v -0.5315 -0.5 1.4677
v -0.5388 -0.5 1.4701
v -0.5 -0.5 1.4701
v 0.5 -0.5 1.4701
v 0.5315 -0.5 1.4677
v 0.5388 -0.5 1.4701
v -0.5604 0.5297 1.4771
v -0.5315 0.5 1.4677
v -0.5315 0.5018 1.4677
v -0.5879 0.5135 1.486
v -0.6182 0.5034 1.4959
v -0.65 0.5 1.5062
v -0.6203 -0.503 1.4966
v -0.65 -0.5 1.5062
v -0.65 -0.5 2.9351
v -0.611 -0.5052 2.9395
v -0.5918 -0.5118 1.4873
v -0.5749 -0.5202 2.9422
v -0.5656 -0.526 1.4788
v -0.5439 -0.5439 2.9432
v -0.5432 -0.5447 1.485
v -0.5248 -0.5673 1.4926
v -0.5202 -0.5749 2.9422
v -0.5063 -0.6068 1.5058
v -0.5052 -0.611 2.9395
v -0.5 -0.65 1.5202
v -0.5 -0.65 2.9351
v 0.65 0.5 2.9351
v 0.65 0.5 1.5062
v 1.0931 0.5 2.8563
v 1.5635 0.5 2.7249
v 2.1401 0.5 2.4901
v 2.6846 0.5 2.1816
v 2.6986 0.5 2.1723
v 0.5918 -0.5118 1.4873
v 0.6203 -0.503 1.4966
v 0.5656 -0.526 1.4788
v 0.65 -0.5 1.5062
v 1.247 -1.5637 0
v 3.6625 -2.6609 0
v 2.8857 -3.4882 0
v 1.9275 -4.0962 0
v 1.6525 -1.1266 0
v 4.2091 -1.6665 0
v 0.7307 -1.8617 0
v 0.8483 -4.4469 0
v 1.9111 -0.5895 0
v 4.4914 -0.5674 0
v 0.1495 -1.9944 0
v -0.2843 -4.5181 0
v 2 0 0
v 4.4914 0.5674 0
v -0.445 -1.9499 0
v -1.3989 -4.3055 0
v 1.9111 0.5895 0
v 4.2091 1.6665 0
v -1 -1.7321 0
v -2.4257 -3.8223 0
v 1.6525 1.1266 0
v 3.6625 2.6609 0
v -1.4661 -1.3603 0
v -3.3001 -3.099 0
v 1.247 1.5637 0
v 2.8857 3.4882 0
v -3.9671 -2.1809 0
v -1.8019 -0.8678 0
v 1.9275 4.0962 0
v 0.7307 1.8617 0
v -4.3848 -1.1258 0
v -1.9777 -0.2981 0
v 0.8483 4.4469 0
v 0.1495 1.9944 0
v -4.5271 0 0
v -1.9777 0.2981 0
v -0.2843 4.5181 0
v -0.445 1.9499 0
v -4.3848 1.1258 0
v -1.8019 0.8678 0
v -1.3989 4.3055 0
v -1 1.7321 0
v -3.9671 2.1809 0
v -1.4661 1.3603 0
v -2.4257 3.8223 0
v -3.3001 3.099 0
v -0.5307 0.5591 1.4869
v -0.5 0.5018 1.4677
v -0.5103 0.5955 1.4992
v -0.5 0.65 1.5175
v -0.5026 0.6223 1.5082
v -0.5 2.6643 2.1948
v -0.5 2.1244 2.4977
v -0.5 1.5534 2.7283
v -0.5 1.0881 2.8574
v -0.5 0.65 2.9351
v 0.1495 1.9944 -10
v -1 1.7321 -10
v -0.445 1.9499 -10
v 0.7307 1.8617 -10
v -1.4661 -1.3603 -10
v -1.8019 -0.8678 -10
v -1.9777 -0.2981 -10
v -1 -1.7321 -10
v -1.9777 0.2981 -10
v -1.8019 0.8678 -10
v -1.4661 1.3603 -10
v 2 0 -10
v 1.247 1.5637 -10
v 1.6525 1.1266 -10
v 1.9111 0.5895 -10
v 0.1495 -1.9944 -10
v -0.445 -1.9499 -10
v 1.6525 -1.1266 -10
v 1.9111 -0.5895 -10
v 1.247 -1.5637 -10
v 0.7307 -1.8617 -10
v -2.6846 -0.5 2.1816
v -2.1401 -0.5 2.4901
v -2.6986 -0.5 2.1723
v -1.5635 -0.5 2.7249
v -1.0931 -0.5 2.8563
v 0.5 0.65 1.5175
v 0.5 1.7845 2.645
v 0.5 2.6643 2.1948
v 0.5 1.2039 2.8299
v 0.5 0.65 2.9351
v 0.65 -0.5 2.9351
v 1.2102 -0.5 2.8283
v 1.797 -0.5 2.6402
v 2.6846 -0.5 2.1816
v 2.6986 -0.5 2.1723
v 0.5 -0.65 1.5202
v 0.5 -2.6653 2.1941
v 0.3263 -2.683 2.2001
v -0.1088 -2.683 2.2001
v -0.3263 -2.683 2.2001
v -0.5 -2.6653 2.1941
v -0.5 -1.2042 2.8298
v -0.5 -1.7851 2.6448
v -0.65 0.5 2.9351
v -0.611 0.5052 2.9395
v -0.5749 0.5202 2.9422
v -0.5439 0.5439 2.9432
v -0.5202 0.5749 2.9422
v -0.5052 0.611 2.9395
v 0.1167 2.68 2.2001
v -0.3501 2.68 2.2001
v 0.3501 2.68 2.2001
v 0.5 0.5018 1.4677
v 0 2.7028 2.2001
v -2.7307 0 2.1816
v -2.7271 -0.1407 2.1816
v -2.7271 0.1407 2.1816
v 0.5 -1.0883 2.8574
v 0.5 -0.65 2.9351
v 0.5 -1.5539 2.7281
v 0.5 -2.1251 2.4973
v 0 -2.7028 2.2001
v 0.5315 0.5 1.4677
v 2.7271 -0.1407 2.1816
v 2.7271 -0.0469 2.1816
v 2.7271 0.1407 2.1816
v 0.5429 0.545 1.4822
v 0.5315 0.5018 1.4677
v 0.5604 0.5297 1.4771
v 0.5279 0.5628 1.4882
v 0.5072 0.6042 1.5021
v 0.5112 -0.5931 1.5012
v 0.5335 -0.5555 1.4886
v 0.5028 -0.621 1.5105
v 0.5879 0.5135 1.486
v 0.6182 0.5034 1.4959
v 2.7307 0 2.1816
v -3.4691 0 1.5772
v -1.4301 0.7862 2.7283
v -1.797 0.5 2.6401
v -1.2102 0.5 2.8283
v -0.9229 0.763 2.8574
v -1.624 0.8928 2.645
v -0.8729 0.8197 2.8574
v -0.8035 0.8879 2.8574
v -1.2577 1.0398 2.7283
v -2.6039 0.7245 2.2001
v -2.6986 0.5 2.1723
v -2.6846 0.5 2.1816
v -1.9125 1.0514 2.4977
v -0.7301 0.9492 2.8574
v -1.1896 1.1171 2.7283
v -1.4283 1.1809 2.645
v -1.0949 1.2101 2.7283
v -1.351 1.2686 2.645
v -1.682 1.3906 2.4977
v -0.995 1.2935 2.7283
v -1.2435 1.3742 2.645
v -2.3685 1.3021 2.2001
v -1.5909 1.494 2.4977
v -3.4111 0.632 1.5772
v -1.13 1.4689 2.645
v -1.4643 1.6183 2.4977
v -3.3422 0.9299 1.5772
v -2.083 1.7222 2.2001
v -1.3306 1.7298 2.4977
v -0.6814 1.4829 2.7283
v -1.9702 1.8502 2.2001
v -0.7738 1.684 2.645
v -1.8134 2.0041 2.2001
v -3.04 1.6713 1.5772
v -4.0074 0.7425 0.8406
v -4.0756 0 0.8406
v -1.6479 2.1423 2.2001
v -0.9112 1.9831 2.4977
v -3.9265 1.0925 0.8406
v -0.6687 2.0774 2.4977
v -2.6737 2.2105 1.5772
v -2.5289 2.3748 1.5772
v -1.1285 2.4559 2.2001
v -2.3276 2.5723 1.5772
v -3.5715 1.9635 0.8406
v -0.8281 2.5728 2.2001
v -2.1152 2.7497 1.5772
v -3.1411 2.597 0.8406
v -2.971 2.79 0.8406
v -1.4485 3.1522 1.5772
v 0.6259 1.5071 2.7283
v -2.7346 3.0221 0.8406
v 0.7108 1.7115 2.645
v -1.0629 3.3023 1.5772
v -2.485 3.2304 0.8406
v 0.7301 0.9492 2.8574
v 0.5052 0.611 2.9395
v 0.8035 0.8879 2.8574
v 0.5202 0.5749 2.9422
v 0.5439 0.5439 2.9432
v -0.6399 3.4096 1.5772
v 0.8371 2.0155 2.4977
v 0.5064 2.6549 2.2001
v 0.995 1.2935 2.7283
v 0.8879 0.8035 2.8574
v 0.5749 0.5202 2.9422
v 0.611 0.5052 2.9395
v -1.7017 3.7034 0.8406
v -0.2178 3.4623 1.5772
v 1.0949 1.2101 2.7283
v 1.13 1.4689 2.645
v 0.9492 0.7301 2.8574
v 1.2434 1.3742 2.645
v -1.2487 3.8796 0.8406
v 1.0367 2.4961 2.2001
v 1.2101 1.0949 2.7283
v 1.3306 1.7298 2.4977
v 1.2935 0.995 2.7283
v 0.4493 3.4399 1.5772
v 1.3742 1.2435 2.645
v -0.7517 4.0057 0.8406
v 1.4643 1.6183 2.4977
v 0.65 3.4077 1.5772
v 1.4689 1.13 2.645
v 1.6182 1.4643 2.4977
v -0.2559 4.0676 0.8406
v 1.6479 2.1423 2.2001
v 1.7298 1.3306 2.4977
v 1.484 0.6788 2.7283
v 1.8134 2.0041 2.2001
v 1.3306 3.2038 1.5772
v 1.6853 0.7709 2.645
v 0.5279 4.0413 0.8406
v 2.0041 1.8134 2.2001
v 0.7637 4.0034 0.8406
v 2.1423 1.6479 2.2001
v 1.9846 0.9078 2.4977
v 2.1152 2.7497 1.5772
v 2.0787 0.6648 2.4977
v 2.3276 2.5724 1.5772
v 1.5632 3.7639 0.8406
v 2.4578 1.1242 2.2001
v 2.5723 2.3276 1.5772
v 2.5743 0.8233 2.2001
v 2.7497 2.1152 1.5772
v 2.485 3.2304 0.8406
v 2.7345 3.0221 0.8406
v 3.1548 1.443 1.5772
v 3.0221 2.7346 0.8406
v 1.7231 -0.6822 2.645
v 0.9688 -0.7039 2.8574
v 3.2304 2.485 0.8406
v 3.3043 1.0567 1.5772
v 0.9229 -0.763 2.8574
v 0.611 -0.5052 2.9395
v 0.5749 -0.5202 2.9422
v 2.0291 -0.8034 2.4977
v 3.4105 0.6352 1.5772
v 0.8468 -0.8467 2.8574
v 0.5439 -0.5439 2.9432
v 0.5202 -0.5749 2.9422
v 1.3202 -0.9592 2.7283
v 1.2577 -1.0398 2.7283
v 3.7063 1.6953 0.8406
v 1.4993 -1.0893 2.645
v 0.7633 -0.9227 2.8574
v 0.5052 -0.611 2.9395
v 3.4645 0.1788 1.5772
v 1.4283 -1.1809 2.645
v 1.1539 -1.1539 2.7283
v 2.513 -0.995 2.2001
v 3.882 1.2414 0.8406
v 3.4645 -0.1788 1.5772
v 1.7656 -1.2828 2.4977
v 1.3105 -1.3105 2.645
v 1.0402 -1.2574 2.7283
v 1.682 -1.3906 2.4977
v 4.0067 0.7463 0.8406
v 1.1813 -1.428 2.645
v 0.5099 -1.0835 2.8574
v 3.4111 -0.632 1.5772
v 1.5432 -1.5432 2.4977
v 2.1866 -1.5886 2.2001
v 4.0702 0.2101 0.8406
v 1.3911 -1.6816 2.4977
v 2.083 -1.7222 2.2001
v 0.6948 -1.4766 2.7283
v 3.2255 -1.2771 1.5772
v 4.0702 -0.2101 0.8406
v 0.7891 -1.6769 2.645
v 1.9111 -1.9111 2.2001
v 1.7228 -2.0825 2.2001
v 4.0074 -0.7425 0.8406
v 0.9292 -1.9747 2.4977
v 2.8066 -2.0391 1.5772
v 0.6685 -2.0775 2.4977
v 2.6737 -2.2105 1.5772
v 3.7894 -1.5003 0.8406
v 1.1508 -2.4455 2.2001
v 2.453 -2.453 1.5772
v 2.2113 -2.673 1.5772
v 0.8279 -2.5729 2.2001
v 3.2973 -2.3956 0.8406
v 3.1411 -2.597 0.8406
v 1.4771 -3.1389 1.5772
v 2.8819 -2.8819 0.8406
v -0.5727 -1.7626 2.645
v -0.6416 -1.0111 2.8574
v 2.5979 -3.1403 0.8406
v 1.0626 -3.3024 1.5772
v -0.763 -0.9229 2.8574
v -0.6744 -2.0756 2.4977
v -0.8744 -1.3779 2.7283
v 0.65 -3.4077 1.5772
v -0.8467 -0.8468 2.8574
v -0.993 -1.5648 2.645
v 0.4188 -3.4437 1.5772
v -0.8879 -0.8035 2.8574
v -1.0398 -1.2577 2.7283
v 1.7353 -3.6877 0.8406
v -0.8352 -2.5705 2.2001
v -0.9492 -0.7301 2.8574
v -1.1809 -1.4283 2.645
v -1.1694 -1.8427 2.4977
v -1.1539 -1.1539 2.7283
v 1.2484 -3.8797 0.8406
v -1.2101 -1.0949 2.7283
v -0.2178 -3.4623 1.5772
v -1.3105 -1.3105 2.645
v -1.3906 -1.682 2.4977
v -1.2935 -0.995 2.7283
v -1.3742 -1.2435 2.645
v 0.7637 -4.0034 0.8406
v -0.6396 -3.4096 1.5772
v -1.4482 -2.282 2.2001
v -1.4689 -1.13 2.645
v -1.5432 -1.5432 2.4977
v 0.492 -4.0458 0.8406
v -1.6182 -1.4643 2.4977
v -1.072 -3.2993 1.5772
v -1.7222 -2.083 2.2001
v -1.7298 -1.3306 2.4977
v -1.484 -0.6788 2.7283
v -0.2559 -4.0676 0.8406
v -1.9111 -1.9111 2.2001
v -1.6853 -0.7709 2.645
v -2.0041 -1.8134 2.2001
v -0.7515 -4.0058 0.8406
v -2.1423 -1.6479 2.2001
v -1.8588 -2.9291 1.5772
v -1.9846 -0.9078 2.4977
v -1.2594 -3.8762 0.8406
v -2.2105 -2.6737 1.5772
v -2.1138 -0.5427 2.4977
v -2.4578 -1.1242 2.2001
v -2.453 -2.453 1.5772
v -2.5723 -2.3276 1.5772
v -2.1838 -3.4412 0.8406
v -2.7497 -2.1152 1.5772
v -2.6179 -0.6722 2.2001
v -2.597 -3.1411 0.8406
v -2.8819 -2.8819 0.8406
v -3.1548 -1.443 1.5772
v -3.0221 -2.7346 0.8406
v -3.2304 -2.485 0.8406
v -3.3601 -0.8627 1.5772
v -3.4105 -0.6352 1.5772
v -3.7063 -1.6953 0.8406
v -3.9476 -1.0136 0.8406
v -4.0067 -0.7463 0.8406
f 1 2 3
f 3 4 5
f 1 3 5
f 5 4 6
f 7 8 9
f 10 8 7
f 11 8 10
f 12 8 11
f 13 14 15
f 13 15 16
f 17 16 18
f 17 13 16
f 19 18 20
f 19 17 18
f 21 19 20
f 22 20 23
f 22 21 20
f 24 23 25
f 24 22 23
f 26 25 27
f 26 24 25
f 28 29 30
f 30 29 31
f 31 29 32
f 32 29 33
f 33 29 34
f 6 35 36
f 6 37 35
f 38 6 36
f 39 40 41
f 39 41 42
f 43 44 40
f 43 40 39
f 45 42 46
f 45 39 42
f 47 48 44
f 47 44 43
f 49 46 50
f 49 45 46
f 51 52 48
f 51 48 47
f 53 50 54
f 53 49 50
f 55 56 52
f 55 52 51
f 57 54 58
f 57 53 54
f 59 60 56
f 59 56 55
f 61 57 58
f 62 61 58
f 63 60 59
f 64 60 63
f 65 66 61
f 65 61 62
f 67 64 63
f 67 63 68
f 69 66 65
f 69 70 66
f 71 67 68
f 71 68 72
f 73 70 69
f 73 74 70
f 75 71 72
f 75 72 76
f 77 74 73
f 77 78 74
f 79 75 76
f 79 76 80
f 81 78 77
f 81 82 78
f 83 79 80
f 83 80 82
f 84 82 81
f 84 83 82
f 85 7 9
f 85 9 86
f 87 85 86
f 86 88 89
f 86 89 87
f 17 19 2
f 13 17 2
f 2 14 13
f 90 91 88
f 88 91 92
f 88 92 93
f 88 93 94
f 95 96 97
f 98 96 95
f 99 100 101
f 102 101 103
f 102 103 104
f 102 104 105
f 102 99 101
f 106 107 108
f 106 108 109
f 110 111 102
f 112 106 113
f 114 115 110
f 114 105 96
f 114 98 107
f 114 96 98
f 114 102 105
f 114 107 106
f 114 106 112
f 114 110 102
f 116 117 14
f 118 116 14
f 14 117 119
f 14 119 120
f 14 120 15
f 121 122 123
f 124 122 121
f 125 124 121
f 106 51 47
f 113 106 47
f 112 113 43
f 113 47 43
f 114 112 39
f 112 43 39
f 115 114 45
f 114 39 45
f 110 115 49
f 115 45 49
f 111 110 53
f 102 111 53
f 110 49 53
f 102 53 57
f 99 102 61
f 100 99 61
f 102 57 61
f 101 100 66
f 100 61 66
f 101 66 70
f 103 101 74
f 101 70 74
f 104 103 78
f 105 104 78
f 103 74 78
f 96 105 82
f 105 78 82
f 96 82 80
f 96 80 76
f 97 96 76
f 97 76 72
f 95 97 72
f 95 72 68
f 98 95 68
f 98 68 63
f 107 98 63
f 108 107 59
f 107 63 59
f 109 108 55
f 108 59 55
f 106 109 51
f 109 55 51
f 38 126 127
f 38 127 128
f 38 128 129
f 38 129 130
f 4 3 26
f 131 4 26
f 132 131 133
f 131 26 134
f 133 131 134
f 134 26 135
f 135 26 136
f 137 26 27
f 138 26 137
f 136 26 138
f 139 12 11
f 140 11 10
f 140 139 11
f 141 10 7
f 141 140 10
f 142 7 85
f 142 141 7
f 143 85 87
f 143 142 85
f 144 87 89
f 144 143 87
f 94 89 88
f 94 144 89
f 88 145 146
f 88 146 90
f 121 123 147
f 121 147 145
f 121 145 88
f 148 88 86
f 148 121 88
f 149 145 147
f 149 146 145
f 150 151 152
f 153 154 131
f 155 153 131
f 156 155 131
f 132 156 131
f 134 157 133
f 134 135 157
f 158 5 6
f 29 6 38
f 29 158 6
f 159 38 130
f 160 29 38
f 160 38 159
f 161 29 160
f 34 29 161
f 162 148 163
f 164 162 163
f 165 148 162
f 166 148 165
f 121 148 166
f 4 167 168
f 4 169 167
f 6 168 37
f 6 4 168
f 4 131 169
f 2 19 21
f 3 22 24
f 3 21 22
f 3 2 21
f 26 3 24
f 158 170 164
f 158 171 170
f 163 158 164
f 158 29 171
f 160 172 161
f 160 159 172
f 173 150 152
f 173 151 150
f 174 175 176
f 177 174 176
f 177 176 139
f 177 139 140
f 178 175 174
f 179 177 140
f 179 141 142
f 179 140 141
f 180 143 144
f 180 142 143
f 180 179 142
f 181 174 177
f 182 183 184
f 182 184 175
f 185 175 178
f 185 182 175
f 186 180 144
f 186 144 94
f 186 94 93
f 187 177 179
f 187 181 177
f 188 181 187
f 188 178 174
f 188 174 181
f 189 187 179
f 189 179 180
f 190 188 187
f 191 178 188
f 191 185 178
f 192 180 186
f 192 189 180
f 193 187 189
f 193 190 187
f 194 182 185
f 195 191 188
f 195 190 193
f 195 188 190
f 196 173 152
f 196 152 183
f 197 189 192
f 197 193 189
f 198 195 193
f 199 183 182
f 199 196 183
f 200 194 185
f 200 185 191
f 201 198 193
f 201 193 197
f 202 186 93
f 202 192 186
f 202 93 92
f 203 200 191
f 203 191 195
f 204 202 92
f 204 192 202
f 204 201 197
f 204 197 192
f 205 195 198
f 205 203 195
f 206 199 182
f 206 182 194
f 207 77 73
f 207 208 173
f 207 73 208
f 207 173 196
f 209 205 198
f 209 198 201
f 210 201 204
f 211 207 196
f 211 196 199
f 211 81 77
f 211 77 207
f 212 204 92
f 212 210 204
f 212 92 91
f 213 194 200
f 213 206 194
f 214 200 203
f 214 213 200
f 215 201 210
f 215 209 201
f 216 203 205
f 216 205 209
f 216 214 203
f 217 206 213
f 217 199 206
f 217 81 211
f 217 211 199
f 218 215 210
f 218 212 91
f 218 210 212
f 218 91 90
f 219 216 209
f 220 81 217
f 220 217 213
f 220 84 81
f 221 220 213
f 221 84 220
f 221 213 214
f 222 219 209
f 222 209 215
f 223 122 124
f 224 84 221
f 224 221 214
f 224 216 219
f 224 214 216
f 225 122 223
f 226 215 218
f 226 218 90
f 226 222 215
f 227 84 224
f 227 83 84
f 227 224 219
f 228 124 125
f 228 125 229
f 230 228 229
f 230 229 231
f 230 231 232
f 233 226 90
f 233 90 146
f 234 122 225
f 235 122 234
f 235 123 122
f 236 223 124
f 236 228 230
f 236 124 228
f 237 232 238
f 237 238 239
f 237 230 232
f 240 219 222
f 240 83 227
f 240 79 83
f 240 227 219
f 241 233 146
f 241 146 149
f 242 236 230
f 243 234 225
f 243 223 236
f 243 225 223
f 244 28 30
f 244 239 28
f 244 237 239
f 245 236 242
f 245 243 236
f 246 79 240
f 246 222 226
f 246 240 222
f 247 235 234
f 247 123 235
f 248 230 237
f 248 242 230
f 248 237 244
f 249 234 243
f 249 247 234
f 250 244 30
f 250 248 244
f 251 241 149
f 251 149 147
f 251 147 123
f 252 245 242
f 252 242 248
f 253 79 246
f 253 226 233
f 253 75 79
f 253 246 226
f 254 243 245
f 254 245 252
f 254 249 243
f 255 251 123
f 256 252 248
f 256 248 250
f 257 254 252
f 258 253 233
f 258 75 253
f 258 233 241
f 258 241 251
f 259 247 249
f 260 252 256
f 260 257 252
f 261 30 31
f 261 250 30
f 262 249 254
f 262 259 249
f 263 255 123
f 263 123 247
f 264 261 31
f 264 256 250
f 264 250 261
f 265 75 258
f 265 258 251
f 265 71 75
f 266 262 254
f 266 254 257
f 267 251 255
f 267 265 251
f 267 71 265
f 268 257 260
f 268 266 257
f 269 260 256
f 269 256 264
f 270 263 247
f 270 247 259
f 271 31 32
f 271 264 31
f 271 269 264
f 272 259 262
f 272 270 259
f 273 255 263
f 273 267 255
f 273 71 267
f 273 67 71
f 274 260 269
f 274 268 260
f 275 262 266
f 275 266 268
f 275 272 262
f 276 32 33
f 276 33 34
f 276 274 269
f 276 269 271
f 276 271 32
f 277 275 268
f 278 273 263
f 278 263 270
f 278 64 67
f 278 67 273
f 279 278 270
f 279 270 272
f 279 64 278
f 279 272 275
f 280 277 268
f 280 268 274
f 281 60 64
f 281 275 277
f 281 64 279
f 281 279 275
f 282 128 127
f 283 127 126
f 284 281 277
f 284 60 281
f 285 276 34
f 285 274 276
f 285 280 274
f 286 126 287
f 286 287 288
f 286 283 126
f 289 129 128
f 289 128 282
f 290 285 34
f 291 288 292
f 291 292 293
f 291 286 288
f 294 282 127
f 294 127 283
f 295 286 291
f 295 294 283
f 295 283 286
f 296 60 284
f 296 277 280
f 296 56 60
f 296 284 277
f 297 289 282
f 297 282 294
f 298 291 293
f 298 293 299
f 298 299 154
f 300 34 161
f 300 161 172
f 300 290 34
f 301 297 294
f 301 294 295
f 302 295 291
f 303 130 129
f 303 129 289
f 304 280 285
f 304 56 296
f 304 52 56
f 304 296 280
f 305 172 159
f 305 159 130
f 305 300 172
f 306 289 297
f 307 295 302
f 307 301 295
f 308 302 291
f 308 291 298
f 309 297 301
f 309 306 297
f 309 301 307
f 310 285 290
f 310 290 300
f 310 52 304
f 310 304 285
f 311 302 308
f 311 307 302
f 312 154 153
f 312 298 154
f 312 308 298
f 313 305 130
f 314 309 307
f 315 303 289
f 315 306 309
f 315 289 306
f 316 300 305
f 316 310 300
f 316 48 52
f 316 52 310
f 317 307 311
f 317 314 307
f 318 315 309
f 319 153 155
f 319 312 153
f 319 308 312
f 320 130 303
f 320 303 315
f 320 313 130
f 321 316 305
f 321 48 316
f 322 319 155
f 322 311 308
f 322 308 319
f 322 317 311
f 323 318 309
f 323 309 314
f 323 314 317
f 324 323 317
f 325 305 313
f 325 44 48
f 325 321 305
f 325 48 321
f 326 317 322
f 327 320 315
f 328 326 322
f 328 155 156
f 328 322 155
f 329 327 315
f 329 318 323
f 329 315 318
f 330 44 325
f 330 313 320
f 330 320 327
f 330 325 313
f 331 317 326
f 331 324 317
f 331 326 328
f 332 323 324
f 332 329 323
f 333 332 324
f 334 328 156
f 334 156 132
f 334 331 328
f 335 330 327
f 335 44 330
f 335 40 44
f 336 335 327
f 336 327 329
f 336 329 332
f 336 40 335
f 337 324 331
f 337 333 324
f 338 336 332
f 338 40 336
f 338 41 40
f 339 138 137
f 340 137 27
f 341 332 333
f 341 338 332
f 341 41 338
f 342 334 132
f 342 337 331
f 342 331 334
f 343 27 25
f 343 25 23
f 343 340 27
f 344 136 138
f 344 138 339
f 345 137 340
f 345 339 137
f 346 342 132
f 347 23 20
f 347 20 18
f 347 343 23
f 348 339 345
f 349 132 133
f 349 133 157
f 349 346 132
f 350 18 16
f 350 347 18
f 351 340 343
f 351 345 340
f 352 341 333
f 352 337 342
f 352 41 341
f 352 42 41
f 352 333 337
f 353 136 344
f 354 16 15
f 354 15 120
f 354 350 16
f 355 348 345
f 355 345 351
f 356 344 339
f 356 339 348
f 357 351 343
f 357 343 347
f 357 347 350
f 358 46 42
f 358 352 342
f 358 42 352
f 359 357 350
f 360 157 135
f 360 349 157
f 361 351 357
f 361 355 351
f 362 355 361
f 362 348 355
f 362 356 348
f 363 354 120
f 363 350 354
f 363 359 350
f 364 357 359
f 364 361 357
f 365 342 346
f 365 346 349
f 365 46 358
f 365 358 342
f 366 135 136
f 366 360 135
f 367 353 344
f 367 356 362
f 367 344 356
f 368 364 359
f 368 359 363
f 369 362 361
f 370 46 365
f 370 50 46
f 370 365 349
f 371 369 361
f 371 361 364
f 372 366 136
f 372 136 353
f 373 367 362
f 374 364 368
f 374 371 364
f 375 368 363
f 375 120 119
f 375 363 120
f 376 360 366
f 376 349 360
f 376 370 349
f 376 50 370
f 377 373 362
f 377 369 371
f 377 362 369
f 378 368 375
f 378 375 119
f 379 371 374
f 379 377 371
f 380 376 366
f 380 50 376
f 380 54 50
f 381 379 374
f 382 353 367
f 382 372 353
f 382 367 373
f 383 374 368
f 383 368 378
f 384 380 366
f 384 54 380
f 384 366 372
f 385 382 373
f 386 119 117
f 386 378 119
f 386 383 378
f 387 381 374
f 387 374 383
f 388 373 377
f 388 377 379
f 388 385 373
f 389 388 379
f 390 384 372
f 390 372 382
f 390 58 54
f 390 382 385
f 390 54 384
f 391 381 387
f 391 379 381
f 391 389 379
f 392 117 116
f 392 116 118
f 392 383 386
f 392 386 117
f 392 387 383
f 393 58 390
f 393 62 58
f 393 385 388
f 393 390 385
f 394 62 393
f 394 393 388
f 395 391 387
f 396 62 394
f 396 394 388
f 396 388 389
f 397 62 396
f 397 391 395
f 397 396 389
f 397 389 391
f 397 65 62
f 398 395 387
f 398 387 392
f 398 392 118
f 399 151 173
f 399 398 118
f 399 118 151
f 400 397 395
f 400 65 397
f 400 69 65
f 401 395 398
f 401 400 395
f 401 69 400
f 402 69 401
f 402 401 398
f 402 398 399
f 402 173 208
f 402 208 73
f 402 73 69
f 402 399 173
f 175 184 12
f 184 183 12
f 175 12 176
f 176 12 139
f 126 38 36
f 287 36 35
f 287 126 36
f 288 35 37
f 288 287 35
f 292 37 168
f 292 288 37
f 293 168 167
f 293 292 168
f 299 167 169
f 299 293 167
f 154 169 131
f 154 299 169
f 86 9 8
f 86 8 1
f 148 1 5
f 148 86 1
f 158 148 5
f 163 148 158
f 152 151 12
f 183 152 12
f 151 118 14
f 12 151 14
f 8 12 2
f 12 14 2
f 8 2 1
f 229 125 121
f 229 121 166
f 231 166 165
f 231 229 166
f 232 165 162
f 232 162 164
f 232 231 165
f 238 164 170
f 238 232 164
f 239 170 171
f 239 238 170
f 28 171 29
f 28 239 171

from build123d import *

# Parameters (mm, degrees)
F3_R           = 2
F4_DEPTH       = 10
F5_W           = 1
F5_H           = 0.8
F6_DEPTH       = 3
F6_DEPTH_BACK  = 3
F7_W           = 1
F7_H           = 0.8
F8_DEPTH       = 3
F8_DEPTH_BACK  = 3
F10_DEPTH      = 0.5
F10_DEPTH_BACK = 0.5
F11_T4_DEPTH   = 1
F12_T1_DEPTH   = 1
F13_T4_DEPTH   = 2.2322667456
F13_T10_DEPTH  = 1.8596499945
F13_T16_DEPTH  = 2.2322667452
F13_T22_DEPTH  = 1.859649995


# Not quite as in the source:
# - a fillet or chamfer that OpenCascade refuses, or shapes differently, is made with other operations: its cross-section is extruded or revolved along the edge and cut away or added


with BuildPart() as f2:
    # F0 (on Front) → F2 (revolve)
    with BuildSketch(Plane.XZ):
        with BuildLine():
            Line((0, 0), (0, 2.9999249461))
            ThreePointArc((0, 2.9999249461), (-2.7199502547, 2.1887322683), (-4.5270512497, 0))
            Line((-4.5270512497, 0), (0, 0))
        make_face()
    revolve(axis=Axis((0, 0, 1.5515517443), (0, 0, -1)))

    # F3 (on face) → F4 (join)
    with BuildSketch(Plane(origin=(0, 0, 0), x_dir=(1, 0, 0), z_dir=(0, 0, -1))):
        Circle(F3_R)
    extrude(amount=F4_DEPTH)

    # F5 (on Front) → F6 (cut, two sides)
    with BuildSketch(Plane.XZ) as f6_sk:
        with Locations((0, 2.6000668348)):
            Rectangle(F5_W, F5_H)
    extrude(amount=-F6_DEPTH, mode=Mode.SUBTRACT)
    extrude(f6_sk.sketch, amount=F6_DEPTH_BACK, mode=Mode.SUBTRACT)

    # F7 (on Right) → F8 (cut, two sides)
    with BuildSketch(Plane.YZ) as f8_sk:
        with Locations((0, 2.5815645484)):
            Rectangle(F7_W, F7_H)
    extrude(amount=F8_DEPTH, mode=Mode.SUBTRACT)
    extrude(f8_sk.sketch, amount=-F8_DEPTH_BACK, mode=Mode.SUBTRACT)

    # F9 (on Front) → F10 (cut, two sides)
    with BuildSketch(Plane.XZ) as f10_sk:
        Polygon((0.5315009621, 1.4676835854), (2.7381633418, 2.1851595957), (-2.7381633418, 2.1851595957), (-0.5315009621, 1.4676835854), (0, 1.4676835854), align=None)
    extrude(amount=F10_DEPTH, mode=Mode.SUBTRACT)
    extrude(f10_sk.sketch, amount=-F10_DEPTH_BACK, mode=Mode.SUBTRACT)

    # F11: chamfer of 0.733 x 2.18 on 1 edges, made by hand


with BuildPart() as f11_tool2:
    # F11_s3 → F11_t4 (new body)
    with BuildSketch(Plane.YZ.offset(0.5)):
        Polygon((2.68, 2.2000668348), (0.5, 1.4670668348), (0.5, 2.2000668348), align=None)
    extrude(amount=-F11_T4_DEPTH)

    split(bisect_by=Plane.XY.offset(1.4676835854), keep=Keep.TOP)


with BuildPart() as f2_1:
    add(f2.part)

    # F11_t1: cut F11_tool2
    add(f11_tool2.part, mode=Mode.SUBTRACT)

    # F12: chamfer of 2.183 x 0.73 on 1 edges, made by hand

    # F12_s2 → F12_t1 (cut)
    with BuildSketch(Plane.YZ.offset(-0.5)):
        Polygon((-0.5, 1.4700668348), (-2.683, 2.2000668348), (-0.5, 2.2000668348), align=None)
    extrude(amount=F12_T1_DEPTH, mode=Mode.SUBTRACT)

    # F13: fillet of radius 0.15 on 4 edges, made by hand


with BuildPart() as f13_tool2:
    # F13_s3 → F13_t4 (new body)
    with BuildSketch(Plane.XY.offset(3.3273335804)):
        with BuildLine():
            ThreePointArc((0.65, -0.5), (0.5439339828, -0.5439339828), (0.5, -0.65))
            Line((0.5, -0.65), (0.5, -0.5))
            Line((0.5, -0.5), (0.65, -0.5))
        make_face()
    extrude(amount=-F13_T4_DEPTH)

    split(bisect_by=Plane(origin=(-0.3807624945, 0, 1.1710694992), x_dir=(0, 1, 0), z_dir=(-0.309207193, 0, 0.950994696)), keep=Keep.TOP)

    split(bisect_by=Plane(origin=(0, 0.3918613388, 1.1718264421), x_dir=(1, 0, 0), z_dir=(0, 0.3171399402, 0.9483787526)), keep=Keep.TOP)


with BuildPart() as f2_2:
    add(f2_1.part)

    # F13_t1: cut F13_tool2
    add(f13_tool2.part, mode=Mode.SUBTRACT)


with BuildPart() as f13_tool8:
    # F13_s9 → F13_t10 (new body)
    with BuildSketch(Plane.XY.offset(3.3273335799)):
        with BuildLine():
            ThreePointArc((0.5, 0.65), (0.5439339828, 0.5439339828), (0.65, 0.5))
            Line((0.65, 0.5), (0.5, 0.5))
            Line((0.5, 0.5), (0.5, 0.65))
        make_face()
    extrude(amount=-F13_T10_DEPTH)

    split(bisect_by=Plane(origin=(0, -0.3923936318, 1.16700971), x_dir=(1, 0, 0), z_dir=(0, -0.3187050207, 0.9478539496)), keep=Keep.TOP)

    split(bisect_by=Plane(origin=(-0.3807624945, 0, 1.1710694992), x_dir=(0, 1, 0), z_dir=(-0.309207193, 0, 0.950994696)), keep=Keep.TOP)


with BuildPart() as f2_3:
    add(f2_2.part)

    # F13_t7: cut F13_tool8
    add(f13_tool8.part, mode=Mode.SUBTRACT)


with BuildPart() as f13_tool14:
    # F13_s15 → F13_t16 (new body)
    with BuildSketch(Plane.XY.offset(1.0950668348)):
        with BuildLine():
            ThreePointArc((-0.65, -0.5), (-0.5439339828, -0.5439339828), (-0.5, -0.65))
            Line((-0.5, -0.65), (-0.5, -0.5))
            Line((-0.5, -0.5), (-0.65, -0.5))
        make_face()
    extrude(amount=F13_T16_DEPTH)

    split(bisect_by=Plane(origin=(0.3807624945, 0, 1.1710694992), x_dir=(0, 1, 0), z_dir=(0.309207193, 0, 0.950994696)), keep=Keep.TOP)

    split(bisect_by=Plane(origin=(0, 0.3918613388, 1.1718264421), x_dir=(1, 0, 0), z_dir=(0, 0.3171399402, 0.9483787526)), keep=Keep.TOP)


with BuildPart() as f2_4:
    add(f2_3.part)

    # F13_t13: cut F13_tool14
    add(f13_tool14.part, mode=Mode.SUBTRACT)


with BuildPart() as f13_tool20:
    # F13_s21 → F13_t22 (new body)
    with BuildSketch(Plane.XY.offset(3.3273335804)):
        with BuildLine():
            ThreePointArc((-0.65, 0.5), (-0.5439339828, 0.5439339828), (-0.5, 0.65))
            Line((-0.5, 0.65), (-0.5, 0.5))
            Line((-0.5, 0.5), (-0.65, 0.5))
        make_face()
    extrude(amount=-F13_T22_DEPTH)

    split(bisect_by=Plane(origin=(0.3807624945, 0, 1.1710694992), x_dir=(0, 1, 0), z_dir=(0.309207193, 0, 0.950994696)), keep=Keep.TOP)

    split(bisect_by=Plane(origin=(0, -0.3923936318, 1.16700971), x_dir=(1, 0, 0), z_dir=(0, -0.3187050207, 0.9478539496)), keep=Keep.TOP)


with BuildPart() as f2_5:
    add(f2_4.part)

    # F13_t19: cut F13_tool20
    add(f13_tool20.part, mode=Mode.SUBTRACT)


solid = f2_5.part
